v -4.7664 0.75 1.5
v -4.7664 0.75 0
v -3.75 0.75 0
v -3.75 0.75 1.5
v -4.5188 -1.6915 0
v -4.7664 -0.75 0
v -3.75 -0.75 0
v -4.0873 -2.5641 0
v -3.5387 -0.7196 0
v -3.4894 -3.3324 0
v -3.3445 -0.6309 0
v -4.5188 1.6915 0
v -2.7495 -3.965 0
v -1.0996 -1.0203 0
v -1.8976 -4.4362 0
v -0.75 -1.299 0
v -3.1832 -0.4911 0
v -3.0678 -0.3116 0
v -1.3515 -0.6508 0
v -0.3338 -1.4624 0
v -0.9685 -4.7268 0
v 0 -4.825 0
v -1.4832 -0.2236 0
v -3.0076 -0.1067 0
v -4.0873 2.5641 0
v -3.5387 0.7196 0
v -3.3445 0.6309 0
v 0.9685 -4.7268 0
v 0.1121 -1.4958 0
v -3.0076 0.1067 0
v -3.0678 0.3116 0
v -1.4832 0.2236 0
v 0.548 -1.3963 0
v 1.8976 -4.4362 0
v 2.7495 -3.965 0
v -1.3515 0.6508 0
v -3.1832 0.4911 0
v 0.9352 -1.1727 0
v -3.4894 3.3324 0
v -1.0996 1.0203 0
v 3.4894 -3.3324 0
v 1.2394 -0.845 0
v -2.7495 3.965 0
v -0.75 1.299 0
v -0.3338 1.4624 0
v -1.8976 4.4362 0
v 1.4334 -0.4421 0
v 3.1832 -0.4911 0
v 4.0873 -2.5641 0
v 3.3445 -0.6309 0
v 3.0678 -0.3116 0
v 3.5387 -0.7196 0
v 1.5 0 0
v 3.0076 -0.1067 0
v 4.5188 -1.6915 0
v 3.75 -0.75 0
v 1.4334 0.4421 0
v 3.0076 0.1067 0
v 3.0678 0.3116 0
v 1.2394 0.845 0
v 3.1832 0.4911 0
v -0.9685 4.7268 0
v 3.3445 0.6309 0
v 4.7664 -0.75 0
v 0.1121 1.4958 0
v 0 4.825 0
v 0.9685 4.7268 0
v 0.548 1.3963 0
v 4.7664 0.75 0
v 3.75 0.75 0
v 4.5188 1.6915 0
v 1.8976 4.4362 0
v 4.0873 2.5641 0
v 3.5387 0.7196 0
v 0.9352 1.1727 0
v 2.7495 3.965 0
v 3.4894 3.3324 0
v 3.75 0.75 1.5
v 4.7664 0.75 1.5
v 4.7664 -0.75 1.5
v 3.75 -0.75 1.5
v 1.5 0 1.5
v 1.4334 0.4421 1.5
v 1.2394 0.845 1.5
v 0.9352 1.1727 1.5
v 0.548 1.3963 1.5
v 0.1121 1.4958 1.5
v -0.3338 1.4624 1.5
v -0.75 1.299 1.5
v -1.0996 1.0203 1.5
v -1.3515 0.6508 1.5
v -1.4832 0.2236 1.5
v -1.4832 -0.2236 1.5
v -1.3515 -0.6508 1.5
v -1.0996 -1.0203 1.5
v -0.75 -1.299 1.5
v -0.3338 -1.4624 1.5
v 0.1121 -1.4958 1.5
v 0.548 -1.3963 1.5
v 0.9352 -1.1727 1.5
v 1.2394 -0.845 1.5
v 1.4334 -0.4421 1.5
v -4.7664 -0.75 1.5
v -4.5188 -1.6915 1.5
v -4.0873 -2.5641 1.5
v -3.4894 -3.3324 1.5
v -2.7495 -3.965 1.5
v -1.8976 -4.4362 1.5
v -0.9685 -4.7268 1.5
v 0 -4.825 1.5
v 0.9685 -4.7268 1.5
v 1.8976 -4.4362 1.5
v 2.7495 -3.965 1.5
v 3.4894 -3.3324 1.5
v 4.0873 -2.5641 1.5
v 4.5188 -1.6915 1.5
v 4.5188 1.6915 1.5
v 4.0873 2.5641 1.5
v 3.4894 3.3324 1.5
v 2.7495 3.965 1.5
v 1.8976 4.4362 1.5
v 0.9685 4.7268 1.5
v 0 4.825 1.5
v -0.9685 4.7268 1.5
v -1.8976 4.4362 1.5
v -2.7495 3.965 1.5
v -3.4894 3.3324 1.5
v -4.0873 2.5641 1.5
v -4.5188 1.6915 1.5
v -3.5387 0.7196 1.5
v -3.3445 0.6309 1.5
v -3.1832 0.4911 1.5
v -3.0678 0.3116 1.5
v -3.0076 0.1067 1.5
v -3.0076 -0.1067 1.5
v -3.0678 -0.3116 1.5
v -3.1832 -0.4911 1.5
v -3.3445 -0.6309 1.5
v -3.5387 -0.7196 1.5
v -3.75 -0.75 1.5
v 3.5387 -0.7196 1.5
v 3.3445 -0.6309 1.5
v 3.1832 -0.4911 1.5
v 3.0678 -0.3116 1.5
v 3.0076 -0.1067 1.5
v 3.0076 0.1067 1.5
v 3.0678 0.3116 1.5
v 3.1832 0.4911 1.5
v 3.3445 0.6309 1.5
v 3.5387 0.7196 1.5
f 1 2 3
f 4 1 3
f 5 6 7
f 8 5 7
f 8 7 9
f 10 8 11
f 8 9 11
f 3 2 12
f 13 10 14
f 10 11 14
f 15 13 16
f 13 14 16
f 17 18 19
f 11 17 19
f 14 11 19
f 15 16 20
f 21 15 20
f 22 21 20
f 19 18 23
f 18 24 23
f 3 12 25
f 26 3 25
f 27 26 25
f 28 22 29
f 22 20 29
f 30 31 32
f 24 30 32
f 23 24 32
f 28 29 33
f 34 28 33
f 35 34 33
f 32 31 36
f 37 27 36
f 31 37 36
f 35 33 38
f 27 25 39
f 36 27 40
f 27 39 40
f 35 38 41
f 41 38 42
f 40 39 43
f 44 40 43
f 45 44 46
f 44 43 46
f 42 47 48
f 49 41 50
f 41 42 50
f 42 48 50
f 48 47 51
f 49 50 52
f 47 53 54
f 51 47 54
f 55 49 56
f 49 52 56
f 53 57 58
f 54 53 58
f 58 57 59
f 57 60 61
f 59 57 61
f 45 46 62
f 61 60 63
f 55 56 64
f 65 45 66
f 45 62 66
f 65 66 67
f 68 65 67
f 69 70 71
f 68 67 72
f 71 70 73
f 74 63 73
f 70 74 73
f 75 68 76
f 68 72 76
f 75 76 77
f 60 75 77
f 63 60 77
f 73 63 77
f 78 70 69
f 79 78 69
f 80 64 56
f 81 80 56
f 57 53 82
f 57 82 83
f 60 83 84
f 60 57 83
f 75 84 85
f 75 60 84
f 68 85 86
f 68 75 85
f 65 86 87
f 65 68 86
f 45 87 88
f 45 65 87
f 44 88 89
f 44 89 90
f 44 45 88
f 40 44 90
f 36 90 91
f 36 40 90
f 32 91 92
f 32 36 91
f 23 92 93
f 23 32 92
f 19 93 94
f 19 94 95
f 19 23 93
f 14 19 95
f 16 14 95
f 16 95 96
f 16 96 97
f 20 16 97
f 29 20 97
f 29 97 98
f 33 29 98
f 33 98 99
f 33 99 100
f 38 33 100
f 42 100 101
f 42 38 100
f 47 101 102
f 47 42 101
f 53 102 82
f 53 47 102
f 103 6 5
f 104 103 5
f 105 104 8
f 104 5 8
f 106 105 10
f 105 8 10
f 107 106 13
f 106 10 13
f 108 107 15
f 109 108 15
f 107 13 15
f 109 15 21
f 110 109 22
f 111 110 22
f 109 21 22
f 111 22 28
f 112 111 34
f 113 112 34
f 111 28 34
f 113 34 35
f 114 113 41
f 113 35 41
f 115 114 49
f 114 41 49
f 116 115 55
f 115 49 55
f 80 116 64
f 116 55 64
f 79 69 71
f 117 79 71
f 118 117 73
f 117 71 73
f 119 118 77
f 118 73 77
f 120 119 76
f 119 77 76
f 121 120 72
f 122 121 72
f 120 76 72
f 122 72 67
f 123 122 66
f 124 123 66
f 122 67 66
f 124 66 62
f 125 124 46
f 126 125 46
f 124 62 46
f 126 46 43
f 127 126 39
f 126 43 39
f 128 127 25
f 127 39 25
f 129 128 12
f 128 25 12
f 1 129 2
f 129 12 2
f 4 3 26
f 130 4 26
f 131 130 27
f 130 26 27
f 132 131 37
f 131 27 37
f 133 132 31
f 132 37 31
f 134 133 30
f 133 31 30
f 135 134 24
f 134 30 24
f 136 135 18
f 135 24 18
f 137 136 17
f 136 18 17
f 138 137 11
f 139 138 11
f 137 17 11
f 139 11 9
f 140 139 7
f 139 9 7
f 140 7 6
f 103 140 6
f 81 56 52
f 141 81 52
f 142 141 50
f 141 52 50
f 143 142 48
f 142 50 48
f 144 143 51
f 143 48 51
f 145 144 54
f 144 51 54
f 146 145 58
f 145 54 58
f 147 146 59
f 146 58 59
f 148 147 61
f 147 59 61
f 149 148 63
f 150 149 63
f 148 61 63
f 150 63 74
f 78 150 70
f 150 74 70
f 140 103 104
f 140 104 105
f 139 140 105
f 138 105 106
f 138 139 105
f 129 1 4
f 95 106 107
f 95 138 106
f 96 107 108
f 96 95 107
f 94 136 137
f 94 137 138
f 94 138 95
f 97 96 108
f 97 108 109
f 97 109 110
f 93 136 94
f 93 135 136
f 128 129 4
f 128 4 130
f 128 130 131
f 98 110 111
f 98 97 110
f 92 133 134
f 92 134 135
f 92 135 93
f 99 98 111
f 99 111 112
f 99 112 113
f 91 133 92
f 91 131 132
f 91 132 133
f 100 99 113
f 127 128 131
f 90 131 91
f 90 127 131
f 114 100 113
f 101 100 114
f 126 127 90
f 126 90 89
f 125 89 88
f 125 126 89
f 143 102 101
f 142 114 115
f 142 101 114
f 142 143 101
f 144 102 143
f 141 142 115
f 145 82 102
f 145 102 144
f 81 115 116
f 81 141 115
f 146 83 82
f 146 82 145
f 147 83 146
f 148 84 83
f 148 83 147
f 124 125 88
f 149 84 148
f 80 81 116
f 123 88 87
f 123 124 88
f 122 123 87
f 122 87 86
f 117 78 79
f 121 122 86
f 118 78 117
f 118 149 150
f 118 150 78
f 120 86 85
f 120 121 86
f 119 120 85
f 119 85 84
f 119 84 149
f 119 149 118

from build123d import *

# Parameters (mm, degrees)
SKETCH_1_R      = 1.5
EXTRUDE_1_DEPTH = 1.5


with BuildPart() as part:
    # Эскиз1 → Бобышка-Вытянуть1 (new body)
    with BuildSketch(Plane.XY):
        with BuildLine():
            ThreePointArc((4.766353428, 0.75), (0, 4.825), (-4.766353428, 0.75))
            Line((-4.766353428, 0.75), (-3.75, 0.75))
            ThreePointArc((-3.75, 0.75), (-3, 0), (-3.75, -0.75))
            Line((-3.75, -0.75), (-4.766353428, -0.75))
            ThreePointArc((-4.766353428, -0.75), (0, -4.825), (4.766353428, -0.75))
            Line((4.766353428, -0.75), (3.75, -0.75))
            ThreePointArc((3.75, -0.75), (3, 0), (3.75, 0.75))
            Line((3.75, 0.75), (4.766353428, 0.75))
        make_face()
        Circle(SKETCH_1_R, mode=Mode.SUBTRACT)
    extrude(amount=EXTRUDE_1_DEPTH)


solid = part.part
